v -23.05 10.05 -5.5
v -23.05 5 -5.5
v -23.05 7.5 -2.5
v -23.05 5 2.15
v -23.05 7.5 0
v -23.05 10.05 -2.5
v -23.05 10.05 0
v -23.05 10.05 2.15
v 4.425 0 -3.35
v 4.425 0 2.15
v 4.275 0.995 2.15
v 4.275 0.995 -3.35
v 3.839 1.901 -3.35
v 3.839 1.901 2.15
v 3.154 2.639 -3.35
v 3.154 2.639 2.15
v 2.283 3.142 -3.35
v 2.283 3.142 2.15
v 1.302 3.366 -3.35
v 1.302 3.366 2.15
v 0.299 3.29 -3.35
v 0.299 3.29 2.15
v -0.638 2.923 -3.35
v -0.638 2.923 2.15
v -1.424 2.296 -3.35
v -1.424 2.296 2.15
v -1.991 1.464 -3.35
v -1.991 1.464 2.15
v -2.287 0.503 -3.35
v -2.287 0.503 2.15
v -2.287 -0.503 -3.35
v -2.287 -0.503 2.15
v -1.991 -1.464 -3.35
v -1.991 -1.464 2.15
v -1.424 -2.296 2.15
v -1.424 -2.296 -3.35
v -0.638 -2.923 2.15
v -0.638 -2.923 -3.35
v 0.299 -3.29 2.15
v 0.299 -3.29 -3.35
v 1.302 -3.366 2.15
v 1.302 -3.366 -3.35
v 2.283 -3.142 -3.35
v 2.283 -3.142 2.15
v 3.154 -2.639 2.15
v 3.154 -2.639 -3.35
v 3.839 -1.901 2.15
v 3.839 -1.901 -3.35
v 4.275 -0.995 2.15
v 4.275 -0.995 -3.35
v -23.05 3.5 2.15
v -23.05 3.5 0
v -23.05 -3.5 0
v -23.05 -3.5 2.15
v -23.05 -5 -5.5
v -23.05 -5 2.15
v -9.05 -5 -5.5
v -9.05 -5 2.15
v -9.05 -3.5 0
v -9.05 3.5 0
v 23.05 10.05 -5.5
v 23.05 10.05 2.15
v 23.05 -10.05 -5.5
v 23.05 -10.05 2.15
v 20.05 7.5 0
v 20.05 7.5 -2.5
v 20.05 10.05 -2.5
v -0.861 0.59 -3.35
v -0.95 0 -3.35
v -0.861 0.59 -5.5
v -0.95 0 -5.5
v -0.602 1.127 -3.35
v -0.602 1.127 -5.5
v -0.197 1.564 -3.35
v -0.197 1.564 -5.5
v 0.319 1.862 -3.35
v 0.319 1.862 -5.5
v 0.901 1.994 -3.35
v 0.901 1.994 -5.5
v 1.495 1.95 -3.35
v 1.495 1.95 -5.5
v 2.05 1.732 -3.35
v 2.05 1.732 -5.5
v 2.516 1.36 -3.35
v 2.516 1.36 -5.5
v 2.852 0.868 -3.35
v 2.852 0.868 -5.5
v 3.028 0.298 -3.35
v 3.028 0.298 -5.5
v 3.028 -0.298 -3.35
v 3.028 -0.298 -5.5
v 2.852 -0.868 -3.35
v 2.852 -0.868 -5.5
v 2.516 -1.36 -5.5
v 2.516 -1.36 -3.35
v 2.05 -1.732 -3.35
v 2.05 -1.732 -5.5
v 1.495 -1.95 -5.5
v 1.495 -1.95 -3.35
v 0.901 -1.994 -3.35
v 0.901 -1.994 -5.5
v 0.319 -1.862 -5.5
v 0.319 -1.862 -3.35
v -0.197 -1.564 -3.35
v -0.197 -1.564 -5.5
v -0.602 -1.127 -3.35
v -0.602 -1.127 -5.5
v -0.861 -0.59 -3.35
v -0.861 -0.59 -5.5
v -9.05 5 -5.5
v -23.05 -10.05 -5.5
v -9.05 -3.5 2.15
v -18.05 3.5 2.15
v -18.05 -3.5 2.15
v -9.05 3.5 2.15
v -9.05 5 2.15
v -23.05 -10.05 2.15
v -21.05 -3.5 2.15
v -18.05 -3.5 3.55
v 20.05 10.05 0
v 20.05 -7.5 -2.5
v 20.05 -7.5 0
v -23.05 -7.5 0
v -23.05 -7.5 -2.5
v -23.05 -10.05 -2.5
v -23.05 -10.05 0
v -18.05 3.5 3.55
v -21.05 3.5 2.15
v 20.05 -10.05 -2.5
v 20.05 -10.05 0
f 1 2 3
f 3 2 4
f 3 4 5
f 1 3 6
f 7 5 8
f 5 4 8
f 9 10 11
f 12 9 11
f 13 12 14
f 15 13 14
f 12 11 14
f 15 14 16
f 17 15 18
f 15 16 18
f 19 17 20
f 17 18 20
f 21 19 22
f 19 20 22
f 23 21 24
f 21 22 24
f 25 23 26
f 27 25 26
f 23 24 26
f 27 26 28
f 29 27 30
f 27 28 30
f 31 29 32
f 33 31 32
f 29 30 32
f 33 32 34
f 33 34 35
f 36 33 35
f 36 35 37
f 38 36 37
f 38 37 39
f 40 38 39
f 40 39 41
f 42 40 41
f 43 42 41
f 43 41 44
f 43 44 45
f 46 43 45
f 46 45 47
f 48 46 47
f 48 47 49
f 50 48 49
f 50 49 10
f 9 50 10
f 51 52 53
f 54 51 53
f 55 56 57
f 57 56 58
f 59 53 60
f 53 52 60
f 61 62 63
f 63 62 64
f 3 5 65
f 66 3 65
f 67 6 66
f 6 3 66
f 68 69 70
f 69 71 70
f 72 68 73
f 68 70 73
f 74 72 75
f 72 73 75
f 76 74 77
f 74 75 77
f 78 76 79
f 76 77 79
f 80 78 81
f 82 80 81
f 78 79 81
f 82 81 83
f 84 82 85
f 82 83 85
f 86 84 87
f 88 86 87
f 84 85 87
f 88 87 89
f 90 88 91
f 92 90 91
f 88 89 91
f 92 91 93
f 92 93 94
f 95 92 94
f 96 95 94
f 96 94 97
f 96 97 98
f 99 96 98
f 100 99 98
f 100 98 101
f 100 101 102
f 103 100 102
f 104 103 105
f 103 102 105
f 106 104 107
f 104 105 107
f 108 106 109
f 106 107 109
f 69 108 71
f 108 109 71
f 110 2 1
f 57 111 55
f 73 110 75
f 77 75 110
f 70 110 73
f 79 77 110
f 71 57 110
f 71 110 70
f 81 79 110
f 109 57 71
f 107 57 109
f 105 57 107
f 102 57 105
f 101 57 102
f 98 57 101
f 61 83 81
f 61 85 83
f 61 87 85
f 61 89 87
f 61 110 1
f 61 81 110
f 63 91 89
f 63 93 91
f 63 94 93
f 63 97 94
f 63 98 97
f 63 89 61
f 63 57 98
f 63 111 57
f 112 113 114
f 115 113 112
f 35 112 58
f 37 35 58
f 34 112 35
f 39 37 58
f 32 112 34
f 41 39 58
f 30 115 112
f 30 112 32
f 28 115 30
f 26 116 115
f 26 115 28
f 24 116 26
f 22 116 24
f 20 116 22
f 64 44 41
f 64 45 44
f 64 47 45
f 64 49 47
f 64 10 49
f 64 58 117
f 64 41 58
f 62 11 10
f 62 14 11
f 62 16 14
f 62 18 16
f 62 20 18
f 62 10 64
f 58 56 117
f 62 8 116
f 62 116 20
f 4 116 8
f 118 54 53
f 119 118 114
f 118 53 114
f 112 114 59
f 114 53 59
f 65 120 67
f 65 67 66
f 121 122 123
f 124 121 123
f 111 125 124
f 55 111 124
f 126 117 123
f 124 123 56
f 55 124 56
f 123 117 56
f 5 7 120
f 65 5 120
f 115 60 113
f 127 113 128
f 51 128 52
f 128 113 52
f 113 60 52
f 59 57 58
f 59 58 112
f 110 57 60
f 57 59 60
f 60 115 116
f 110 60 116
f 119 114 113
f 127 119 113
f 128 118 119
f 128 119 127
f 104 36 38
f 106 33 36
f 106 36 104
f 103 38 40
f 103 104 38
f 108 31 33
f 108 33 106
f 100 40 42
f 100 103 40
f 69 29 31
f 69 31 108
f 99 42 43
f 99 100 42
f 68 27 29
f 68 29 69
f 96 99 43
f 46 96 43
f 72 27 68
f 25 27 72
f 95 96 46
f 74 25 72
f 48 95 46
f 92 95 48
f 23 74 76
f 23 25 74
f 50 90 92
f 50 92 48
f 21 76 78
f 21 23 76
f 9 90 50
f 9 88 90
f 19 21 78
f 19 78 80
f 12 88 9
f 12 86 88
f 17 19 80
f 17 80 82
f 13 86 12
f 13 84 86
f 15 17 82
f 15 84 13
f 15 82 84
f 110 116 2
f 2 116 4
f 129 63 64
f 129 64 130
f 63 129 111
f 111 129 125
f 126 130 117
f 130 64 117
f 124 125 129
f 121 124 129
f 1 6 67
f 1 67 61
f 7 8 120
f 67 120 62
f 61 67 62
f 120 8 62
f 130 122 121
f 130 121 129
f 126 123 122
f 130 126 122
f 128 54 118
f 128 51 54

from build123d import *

# Parameters (mm, degrees)
F2_DEPTH        = 2.15
F3_W            = 3
F3_H            = 7
F4_DEPTH        = 1.4
F5_SIZE2        = 1.39999
F5_SIZE         = 2.99999
F6_W            = 3
F6_H            = 2.55
F7_DEPTH        = 2.5
F8_W            = 43.1
F8_H            = 2.55
F9_DEPTH        = 3
F11_D           = 4
F11_CBORE_D     = 6.75
F11_CBORE_DEPTH = 5.5


# Not quite as in the source:
# - a fillet or chamfer is up to 0.001 mm smaller than in the source, because OpenCascade refuses the exact size


with BuildPart() as f2:
    # F1 (on Top) → F2 (new body)
    with BuildSketch(Plane.XY):
        Polygon((-23.05, -5), (-23.05, -10.05), (23.05, -10.05), (23.05, 10.05), (-23.05, 10.05), (-23.05, 5), (-9.05, 5), (-9.05, 3.5), (-23.05, 3.5), (-23.05, -3.5), (-9.05, -3.5), (-9.05, -5), align=None)
    extrude(amount=F2_DEPTH)

    # F3 (on face) → F4 (join)
    with BuildSketch(Plane.XY.offset(2.15)):
        with Locations((-19.55, 0)):
            Rectangle(F3_W, F3_H)
    extrude(amount=F4_DEPTH)

    # F5 (size 3 and 1.4 in the source; OpenCascade refuses exactly that, so slightly less here)
    f5_edges = [f2.edges().sort_by_distance(p)[0] for p in [
        (-21.05, 0, 3.55),
    ]]
    f5_side = f2.faces().sort_by_distance((-19.55, 0, 3.55))[0]
    chamfer(f5_edges, length=F5_SIZE, length2=F5_SIZE2, reference=f5_side)

    # F6 (on face) → F7 (join)
    with BuildSketch(Plane(origin=(0, 0, 0), x_dir=(1, 0, 0), z_dir=(0, 0, -1))):
        Polygon((-23.05, -5), (-23.05, -7.5), (20.05, -7.5), (23.05, -7.5), (23.05, 7.5), (20.05, 7.5), (-23.05, 7.5), (-23.05, 5), (-9.05, 5), (-9.05, 3.5), (-9.05, -3.5), (-9.05, -5), align=None)
        with Locations((21.55, 8.775)):
            Rectangle(F6_W, F6_H)
        with Locations((21.55, -8.775)):
            Rectangle(F6_W, F6_H)
    extrude(amount=F7_DEPTH)

    # F8 (on face) → F9 (join)
    with BuildSketch(Plane(origin=(0, 0, -2.5), x_dir=(1, 0, 0), z_dir=(0, 0, -1))):
        Polygon((23.05, -10.05), (23.05, 10.05), (20.05, 10.05), (20.05, 7.5), (-23.05, 7.5), (-23.05, 5), (-9.05, 5), (-9.05, -5), (-23.05, -5), (-23.05, -7.5), (20.05, -7.5), (20.05, -10.05), align=None)
        with Locations((-1.5, -8.775)):
            Rectangle(F8_W, F8_H)
        with Locations((-1.5, 8.775)):
            Rectangle(F8_W, F8_H)
    extrude(amount=F9_DEPTH)

    # F11 (through all)
    with Locations(Plane.XY.offset(2.15)):
        with Locations((1.05, 0)):
            CounterBoreHole(F11_D / 2, F11_CBORE_D / 2, F11_CBORE_DEPTH)


solid = f2.part
